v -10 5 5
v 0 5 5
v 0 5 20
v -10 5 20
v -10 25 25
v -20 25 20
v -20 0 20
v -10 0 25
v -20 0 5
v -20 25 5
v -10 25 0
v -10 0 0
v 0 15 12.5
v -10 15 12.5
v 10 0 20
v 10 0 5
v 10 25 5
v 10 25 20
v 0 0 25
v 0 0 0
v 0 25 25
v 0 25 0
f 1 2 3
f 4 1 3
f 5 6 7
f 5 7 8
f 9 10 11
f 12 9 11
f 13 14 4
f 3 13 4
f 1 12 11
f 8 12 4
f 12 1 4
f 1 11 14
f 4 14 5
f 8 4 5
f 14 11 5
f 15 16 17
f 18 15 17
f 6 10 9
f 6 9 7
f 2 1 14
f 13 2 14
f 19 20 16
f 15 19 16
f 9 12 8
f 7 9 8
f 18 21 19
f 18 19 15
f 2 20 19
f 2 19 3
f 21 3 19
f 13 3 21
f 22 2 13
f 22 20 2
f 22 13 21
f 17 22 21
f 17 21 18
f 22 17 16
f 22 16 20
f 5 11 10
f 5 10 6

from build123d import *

# Parameters (mm, degrees)
SKETCH1_W           = 10
SKETCH1_H           = 25
BOSS_EXTRUDE1_DEPTH = 25
CUT_EXTRUDE1_DEPTH  = 25
SKETCH3_W           = 15
SKETCH3_H           = 10
BOSS_EXTRUDE2_DEPTH = 10
CUT_EXTRUDE2_DEPTH  = 10
SKETCH5_W           = 25
SKETCH5_H           = 25
BOSS_EXTRUDE3_DEPTH = 10
CUT_EXTRUDE3_DEPTH  = 25


with BuildPart() as part:
    # Sketch1 → Boss-Extrude1 (new body)
    with BuildSketch(Plane.XY):
        with Locations((5, 12.5)):
            Rectangle(SKETCH1_W, SKETCH1_H)
    extrude(amount=BOSS_EXTRUDE1_DEPTH)

    # Sketch2 → Cut-Extrude1 (cut)
    with BuildSketch(Plane(origin=(0, 25, 0), x_dir=(1, 0, 0), z_dir=(0, 1, 0))):
        Polygon((0, 0), (10, 0), (10, -5), align=None)
        Polygon((0, -25), (10, -20), (10, -25), align=None)
    extrude(amount=-CUT_EXTRUDE1_DEPTH, mode=Mode.SUBTRACT)

    # Sketch3 → Boss-Extrude2 (add)
    with BuildSketch(Plane.ZY):
        with Locations((12.5, 10)):
            Rectangle(SKETCH3_W, SKETCH3_H)
    extrude(amount=BOSS_EXTRUDE2_DEPTH)

    # Sketch4 → Cut-Extrude2 (cut)
    with BuildSketch(Plane.ZY.offset(10)):
        Polygon((20, 15), (12.5, 15), (20, 5), align=None)
        Polygon((5, 15), (5, 5), (12.5, 15), align=None)
    extrude(amount=-CUT_EXTRUDE2_DEPTH, mode=Mode.SUBTRACT)

    # Sketch5 → Boss-Extrude3 (add)
    with BuildSketch(Plane.ZY.offset(10)):
        with Locations((12.5, 12.5)):
            Rectangle(SKETCH5_W, SKETCH5_H)
    extrude(amount=BOSS_EXTRUDE3_DEPTH)

    # Sketch6 → Cut-Extrude3 (cut)
    with BuildSketch(Plane(origin=(0, 25, 0), x_dir=(1, 0, 0), z_dir=(0, 1, 0))):
        Polygon((-10, 0), (-20, 0), (-20, -5), align=None)
        Polygon((-20, -25), (-20, -20), (-10, -25), align=None)
    extrude(amount=-CUT_EXTRUDE3_DEPTH, mode=Mode.SUBTRACT)


solid = part.part
